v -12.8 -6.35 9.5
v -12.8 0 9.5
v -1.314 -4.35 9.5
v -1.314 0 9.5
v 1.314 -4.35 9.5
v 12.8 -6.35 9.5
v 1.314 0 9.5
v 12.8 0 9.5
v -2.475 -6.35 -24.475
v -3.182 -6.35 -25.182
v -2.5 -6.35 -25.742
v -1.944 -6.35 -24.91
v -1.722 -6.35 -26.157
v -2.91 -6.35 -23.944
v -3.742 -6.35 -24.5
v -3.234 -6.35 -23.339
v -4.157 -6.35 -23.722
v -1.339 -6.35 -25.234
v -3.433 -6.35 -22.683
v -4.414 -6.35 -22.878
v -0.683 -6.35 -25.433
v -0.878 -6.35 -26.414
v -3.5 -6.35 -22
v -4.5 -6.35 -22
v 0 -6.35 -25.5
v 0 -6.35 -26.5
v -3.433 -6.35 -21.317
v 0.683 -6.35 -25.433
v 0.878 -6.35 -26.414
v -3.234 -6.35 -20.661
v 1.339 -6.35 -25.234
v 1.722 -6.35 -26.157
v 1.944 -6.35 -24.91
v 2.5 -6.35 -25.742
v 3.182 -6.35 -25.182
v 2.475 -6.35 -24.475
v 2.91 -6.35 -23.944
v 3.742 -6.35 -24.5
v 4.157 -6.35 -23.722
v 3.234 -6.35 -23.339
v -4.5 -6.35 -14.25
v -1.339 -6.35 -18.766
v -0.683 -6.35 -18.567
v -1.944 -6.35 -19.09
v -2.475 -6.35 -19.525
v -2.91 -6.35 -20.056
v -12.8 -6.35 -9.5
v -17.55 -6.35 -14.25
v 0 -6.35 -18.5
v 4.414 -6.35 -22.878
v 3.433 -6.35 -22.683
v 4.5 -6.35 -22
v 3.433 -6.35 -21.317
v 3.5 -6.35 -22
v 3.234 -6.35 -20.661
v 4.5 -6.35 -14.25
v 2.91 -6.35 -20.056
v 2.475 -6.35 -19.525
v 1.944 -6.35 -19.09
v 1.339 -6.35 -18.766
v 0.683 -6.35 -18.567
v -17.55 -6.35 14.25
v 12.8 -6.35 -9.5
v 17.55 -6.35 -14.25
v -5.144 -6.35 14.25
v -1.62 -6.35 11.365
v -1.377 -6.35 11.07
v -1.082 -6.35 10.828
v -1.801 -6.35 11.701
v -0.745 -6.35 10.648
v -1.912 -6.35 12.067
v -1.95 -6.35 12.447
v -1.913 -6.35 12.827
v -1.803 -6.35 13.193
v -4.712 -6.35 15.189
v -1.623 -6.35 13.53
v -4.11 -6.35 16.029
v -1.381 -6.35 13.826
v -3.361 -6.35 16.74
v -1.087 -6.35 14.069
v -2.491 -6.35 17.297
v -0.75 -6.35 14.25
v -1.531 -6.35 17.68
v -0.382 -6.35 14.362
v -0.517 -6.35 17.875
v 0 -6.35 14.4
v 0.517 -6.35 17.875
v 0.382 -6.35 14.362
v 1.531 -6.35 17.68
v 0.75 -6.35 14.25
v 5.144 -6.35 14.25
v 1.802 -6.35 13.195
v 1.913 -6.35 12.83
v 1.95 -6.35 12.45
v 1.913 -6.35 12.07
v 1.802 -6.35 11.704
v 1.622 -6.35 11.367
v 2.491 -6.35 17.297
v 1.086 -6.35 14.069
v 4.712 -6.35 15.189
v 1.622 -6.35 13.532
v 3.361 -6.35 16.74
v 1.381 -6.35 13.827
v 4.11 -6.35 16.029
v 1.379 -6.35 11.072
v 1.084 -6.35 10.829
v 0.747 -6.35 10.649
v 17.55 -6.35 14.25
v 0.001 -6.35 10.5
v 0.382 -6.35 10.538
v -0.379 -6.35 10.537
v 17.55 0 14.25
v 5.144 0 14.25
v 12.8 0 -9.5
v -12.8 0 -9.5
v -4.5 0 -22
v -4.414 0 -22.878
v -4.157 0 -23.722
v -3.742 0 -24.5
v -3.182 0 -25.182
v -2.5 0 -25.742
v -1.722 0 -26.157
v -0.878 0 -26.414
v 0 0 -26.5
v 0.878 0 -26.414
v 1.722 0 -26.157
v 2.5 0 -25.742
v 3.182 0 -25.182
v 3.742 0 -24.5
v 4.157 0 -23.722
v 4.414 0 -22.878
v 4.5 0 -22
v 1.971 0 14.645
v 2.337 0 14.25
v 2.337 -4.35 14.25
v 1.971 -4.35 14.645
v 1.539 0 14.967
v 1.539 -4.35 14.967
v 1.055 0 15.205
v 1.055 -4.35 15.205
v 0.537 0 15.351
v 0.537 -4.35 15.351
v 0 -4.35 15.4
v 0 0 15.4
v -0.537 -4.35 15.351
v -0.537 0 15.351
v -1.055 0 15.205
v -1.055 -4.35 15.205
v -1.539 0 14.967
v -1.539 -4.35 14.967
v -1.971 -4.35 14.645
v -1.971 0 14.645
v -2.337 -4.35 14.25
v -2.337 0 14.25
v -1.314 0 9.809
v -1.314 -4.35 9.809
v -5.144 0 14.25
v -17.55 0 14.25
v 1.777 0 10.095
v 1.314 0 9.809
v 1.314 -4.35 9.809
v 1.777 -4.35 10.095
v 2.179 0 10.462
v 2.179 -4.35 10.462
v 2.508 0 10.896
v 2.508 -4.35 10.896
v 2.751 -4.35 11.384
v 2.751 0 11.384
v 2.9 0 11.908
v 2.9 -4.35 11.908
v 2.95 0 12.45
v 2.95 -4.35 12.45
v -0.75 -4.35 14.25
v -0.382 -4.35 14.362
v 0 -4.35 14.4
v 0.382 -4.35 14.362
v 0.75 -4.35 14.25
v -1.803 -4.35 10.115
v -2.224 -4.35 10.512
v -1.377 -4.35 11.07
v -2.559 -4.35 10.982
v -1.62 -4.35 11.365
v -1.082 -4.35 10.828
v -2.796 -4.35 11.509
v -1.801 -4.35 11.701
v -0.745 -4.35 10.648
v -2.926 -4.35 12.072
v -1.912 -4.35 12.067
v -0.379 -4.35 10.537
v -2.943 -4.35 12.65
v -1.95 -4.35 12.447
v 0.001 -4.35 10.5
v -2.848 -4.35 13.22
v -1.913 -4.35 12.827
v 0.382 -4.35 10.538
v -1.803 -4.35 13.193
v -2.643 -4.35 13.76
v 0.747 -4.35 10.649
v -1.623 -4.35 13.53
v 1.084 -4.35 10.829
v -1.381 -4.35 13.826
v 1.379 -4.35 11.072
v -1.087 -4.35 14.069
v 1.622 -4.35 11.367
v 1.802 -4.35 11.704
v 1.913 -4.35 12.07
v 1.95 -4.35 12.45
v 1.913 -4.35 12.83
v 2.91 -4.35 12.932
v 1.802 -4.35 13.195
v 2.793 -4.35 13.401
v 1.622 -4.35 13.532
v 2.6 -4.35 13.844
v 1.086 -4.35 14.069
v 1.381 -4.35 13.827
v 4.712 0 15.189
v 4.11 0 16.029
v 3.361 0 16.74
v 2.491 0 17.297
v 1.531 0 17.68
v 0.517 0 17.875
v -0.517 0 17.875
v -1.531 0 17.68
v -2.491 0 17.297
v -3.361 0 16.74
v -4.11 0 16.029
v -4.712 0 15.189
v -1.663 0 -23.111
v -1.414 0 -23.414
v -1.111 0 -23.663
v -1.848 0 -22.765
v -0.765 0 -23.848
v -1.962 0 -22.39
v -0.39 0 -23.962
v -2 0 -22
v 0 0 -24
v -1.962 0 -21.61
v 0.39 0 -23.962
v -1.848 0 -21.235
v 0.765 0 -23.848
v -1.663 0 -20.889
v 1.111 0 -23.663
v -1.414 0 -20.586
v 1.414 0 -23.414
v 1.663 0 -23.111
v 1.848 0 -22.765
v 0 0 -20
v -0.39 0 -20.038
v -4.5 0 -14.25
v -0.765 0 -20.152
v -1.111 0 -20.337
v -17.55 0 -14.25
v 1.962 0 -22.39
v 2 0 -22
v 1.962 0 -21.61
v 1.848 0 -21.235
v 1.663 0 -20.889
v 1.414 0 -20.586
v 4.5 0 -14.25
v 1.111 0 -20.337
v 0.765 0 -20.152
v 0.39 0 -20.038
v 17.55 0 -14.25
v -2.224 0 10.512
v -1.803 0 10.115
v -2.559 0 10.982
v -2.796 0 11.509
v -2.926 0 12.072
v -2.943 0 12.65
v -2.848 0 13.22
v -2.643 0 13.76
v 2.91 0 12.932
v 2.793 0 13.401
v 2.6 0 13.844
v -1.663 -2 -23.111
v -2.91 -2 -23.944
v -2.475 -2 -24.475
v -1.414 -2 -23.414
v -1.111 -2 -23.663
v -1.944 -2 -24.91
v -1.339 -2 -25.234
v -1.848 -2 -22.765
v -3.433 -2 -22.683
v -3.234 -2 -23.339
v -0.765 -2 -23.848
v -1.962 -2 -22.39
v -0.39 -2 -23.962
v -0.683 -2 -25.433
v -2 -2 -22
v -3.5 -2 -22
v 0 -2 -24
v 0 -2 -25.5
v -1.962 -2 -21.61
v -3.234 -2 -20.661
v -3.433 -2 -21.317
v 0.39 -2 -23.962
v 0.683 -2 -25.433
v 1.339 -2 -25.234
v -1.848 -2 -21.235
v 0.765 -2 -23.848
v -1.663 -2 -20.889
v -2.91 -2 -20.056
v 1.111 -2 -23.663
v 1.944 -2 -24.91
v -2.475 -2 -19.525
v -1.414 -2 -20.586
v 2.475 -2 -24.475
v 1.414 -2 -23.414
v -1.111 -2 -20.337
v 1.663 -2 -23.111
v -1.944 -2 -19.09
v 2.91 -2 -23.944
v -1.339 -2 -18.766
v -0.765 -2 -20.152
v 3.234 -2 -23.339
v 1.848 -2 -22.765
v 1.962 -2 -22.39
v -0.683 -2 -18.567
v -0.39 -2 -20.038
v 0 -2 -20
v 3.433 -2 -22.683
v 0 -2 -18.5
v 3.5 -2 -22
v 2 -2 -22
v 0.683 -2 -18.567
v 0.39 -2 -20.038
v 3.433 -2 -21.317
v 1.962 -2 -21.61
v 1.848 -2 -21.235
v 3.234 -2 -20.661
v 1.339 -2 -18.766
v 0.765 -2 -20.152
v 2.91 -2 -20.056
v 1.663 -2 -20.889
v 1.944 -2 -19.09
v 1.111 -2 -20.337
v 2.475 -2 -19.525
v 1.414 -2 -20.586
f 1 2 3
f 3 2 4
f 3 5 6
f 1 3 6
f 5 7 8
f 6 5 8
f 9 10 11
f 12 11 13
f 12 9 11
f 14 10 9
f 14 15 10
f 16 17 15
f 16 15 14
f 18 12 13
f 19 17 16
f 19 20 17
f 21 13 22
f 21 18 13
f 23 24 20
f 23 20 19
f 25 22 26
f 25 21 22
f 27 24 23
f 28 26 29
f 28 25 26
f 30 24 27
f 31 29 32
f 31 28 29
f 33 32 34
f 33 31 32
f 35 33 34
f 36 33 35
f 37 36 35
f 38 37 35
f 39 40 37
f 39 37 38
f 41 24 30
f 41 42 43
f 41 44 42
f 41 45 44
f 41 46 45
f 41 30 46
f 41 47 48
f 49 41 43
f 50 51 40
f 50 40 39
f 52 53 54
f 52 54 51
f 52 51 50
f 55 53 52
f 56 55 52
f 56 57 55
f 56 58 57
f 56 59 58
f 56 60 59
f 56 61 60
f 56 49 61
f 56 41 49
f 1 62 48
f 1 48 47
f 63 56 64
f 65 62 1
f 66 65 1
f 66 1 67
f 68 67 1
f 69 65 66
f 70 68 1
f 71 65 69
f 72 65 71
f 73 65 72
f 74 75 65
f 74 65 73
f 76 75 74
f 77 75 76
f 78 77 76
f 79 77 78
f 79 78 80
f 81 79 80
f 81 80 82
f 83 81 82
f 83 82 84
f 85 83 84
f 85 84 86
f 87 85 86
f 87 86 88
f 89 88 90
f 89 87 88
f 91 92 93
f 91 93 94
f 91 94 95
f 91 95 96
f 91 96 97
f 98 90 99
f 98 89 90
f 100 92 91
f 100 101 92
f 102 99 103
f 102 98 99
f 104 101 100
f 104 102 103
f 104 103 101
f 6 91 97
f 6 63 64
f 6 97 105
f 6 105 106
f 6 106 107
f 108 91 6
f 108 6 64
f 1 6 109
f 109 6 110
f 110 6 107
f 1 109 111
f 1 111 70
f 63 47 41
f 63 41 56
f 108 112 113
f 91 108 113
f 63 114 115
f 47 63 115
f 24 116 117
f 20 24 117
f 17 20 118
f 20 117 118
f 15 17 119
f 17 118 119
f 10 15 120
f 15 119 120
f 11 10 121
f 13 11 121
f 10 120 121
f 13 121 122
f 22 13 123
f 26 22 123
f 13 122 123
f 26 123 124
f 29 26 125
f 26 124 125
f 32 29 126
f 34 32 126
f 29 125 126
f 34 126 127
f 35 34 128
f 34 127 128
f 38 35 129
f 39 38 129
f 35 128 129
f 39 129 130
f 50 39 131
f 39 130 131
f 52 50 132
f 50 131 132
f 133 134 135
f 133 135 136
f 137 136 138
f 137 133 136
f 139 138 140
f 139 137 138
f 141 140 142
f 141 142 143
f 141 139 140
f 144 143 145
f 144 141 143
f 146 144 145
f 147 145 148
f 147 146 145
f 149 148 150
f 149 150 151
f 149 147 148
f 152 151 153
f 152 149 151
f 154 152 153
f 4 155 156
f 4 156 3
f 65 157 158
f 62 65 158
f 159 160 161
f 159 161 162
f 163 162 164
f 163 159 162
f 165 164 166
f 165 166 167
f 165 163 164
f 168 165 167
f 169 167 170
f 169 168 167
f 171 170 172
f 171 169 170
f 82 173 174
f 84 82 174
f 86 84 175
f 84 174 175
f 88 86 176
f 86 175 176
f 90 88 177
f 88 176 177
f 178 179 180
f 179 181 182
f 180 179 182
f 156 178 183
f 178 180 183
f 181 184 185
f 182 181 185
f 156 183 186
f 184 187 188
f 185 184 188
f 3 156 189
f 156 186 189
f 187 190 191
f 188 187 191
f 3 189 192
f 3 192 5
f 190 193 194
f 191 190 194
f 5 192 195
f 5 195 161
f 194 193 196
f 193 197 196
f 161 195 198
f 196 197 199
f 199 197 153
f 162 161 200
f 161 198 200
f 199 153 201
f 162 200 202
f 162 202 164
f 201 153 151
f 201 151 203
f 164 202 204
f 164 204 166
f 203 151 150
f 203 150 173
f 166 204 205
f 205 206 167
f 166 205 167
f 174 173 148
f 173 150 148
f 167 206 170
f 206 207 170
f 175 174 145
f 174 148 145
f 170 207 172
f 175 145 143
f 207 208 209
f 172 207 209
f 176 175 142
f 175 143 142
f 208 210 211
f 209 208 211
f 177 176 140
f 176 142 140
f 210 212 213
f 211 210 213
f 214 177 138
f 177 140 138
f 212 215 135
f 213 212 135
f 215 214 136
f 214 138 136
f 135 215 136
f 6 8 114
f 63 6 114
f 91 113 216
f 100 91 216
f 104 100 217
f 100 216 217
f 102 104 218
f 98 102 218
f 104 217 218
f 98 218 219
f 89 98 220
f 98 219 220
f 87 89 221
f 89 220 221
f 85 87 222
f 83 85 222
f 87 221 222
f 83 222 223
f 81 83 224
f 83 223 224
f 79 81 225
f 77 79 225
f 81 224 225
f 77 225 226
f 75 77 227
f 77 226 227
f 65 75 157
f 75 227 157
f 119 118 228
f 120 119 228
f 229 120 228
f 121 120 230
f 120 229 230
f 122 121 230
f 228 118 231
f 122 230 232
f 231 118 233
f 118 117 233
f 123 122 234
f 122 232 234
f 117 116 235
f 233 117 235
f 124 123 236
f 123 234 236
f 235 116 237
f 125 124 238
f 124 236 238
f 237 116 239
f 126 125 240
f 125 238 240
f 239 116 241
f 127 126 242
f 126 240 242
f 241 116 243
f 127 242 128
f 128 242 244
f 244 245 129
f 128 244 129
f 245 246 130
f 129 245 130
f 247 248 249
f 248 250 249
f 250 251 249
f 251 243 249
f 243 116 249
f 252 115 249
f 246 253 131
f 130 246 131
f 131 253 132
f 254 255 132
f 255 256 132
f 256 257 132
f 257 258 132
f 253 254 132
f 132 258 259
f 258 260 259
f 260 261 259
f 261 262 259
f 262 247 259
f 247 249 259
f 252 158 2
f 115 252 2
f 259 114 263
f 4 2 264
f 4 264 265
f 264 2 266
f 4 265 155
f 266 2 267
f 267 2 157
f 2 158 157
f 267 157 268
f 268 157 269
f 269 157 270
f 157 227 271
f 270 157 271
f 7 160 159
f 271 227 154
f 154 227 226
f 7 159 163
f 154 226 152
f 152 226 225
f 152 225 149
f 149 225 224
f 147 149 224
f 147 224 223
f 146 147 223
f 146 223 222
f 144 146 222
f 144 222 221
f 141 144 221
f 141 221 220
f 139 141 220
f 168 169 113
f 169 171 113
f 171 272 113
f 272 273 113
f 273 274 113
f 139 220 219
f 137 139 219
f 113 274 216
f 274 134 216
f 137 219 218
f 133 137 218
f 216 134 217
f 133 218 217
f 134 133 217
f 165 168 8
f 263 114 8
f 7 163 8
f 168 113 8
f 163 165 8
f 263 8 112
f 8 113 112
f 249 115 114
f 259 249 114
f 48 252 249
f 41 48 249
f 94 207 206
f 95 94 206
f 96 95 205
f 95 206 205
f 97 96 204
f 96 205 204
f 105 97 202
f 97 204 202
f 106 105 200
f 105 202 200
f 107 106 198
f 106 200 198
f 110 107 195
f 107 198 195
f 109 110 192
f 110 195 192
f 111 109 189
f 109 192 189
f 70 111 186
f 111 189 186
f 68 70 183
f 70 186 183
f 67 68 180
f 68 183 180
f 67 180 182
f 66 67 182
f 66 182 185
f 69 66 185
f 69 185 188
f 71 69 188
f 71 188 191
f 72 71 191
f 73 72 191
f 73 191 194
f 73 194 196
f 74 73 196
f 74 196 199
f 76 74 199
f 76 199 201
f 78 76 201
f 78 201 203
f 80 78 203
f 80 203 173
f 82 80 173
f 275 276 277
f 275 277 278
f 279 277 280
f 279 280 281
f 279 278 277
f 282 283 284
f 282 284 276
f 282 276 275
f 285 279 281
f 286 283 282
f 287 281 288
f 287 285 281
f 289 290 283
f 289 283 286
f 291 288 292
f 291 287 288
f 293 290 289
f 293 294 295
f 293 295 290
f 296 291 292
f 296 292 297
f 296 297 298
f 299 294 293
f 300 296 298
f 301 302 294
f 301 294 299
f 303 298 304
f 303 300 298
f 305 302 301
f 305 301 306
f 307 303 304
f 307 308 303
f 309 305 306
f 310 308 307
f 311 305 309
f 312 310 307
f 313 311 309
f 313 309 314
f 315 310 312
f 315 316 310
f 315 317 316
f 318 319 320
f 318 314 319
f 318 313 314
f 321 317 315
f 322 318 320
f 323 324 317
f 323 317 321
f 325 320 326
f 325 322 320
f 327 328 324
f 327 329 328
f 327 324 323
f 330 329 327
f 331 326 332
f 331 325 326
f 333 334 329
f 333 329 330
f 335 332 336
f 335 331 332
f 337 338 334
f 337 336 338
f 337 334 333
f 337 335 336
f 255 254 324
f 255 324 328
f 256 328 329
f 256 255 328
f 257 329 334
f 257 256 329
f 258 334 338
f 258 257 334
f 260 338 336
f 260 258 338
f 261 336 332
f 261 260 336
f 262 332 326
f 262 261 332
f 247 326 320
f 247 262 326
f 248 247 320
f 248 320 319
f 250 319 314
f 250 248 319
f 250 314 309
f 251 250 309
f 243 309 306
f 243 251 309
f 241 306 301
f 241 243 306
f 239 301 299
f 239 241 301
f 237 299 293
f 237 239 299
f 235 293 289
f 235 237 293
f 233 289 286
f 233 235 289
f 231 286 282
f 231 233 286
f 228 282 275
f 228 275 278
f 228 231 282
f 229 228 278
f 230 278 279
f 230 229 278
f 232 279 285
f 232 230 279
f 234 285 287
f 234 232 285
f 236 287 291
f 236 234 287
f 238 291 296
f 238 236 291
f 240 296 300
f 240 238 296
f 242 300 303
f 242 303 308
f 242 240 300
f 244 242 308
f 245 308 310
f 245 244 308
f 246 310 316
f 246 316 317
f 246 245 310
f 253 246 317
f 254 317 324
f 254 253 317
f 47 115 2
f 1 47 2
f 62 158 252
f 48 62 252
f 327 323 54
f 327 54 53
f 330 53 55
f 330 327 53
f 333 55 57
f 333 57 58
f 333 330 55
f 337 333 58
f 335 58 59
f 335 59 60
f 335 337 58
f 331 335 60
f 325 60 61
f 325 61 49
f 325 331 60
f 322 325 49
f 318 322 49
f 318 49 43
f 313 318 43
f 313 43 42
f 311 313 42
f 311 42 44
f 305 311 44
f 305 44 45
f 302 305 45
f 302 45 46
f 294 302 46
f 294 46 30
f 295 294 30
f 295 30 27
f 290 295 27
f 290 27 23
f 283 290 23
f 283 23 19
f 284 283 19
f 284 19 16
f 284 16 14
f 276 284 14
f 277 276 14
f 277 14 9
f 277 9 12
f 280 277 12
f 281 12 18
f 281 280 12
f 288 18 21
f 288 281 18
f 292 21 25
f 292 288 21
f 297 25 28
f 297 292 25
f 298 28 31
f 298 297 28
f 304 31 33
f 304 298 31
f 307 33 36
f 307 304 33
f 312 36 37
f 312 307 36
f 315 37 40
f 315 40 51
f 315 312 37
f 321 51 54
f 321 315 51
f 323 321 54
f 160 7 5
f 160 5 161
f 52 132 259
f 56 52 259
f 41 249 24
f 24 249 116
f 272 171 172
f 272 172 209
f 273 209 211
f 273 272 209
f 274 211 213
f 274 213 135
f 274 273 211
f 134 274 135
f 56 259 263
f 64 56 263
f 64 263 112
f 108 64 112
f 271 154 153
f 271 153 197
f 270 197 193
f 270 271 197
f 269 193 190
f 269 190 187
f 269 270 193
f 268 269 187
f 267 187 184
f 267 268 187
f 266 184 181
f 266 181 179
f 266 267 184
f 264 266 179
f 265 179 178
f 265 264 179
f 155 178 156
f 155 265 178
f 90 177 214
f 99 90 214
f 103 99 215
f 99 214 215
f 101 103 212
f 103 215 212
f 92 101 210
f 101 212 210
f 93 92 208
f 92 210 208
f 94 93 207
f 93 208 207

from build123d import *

# Parameters (mm, degrees)
F0_R     = 3.5
F1_DEPTH = 6.35
F0_R_2   = 2
F2_DEPTH = 2
F4_DEPTH = 4.35


with BuildPart() as f1:
    # F0 (on Front) → F1 (new body)
    with BuildSketch(Plane.XZ):
        with BuildLine():
            ThreePointArc((2.95, 12.45), (2.0859650045, 10.3640349955), (0, 9.5))
            ThreePointArc((0, 9.5), (-2.6469321865, 11.1475983722), (-2.3371991785, 14.25))
            Line((-2.3371991785, 14.25), (-5.144171459, 14.25))
            Line((-5.144171459, 14.25), (-17.55, 14.25))
            Line((-17.55, 14.25), (-17.55, -14.25))
            Line((-17.55, -14.25), (-4.5, -14.25))
            Line((-4.5, -14.25), (4.5, -14.25))
            Line((4.5, -14.25), (17.55, -14.25))
            Line((17.55, -14.25), (17.55, 14.25))
            Line((17.55, 14.25), (5.144171459, 14.25))
            Line((5.144171459, 14.25), (2.3371991785, 14.25))
            ThreePointArc((2.3371991785, 14.25), (2.7926007212, 13.4007266756), (2.95, 12.45))
        make_face()
        Polygon((-12.8, -9.5), (-12.8, 9.5), (0, 9.5), (12.8, 9.5), (12.8, -9.5), align=None, mode=Mode.SUBTRACT)
        with BuildLine():
            ThreePointArc((-2.3371991785, 14.25), (-2.6469321865, 11.1475983722), (0, 9.5))
            ThreePointArc((0, 9.5), (2.0859650045, 10.3640349955), (2.95, 12.45))
            ThreePointArc((2.95, 12.45), (2.7926007212, 13.4007266756), (2.3371991785, 14.25))
            Line((2.3371991785, 14.25), (0.75, 14.25))
            ThreePointArc((0.75, 14.25), (1.622498074, 13.5316653826), (1.95, 12.45))
            ThreePointArc((1.95, 12.45), (-1.0816653826, 10.827501926), (-0.75, 14.25))
            Line((-0.75, 14.25), (-2.3371991785, 14.25))
        make_face()
        with BuildLine():
            Line((-5.144171459, 14.25), (-2.3371991785, 14.25))
            ThreePointArc((-2.3371991785, 14.25), (0, 15.4), (2.3371991785, 14.25))
            Line((2.3371991785, 14.25), (5.144171459, 14.25))
            ThreePointArc((5.144171459, 14.25), (0, 17.9), (-5.144171459, 14.25))
        make_face()
        with BuildLine():
            ThreePointArc((2.3371991785, 14.25), (0, 15.4), (-2.3371991785, 14.25))
            Line((-2.3371991785, 14.25), (-0.75, 14.25))
            ThreePointArc((-0.75, 14.25), (0, 14.4), (0.75, 14.25))
            Line((0.75, 14.25), (2.3371991785, 14.25))
        make_face()
        with BuildLine():
            Line((4.5, -14.25), (-4.5, -14.25))
            Line((-4.5, -14.25), (-4.5, -22))
            ThreePointArc((-4.5, -22), (0, -26.5), (4.5, -22))
            Line((4.5, -22), (4.5, -14.25))
        make_face()
        with Locations((0, -22)):
            Circle(F0_R, mode=Mode.SUBTRACT)
    extrude(amount=F1_DEPTH)

    # F0 (on Front) → F2 (join)
    with BuildSketch(Plane.XZ):
        with Locations((0, -22)):
            Circle(F0_R)
        with Locations((0, -22)):
            Circle(F0_R_2, mode=Mode.SUBTRACT)
    extrude(amount=F2_DEPTH)

    # F0 (on Front) + F3 (on face) → F4 (cut)
    with BuildSketch(Plane.XZ):
        with BuildLine():
            ThreePointArc((-2.3371991785, 14.25), (-2.6469321865, 11.1475983722), (0, 9.5))
            ThreePointArc((0, 9.5), (2.0859650045, 10.3640349955), (2.95, 12.45))
            ThreePointArc((2.95, 12.45), (2.7926007212, 13.4007266756), (2.3371991785, 14.25))
            Line((2.3371991785, 14.25), (0.75, 14.25))
            ThreePointArc((0.75, 14.25), (1.622498074, 13.5316653826), (1.95, 12.45))
            ThreePointArc((1.95, 12.45), (-1.0816653826, 10.827501926), (-0.75, 14.25))
            Line((-0.75, 14.25), (-2.3371991785, 14.25))
        make_face()
        with BuildLine():
            ThreePointArc((2.3371991785, 14.25), (0, 15.4), (-2.3371991785, 14.25))
            Line((-2.3371991785, 14.25), (-0.75, 14.25))
            ThreePointArc((-0.75, 14.25), (0, 14.4), (0.75, 14.25))
            Line((0.75, 14.25), (2.3371991785, 14.25))
        make_face()
    with BuildSketch(Plane.XZ):
        with BuildLine():
            Line((-1.3135344248, 9.5), (0, 9.5))
            ThreePointArc((0, 9.5), (-0.6746464011, 9.5781796307), (-1.3135344248, 9.8085747569))
            Line((-1.3135344248, 9.8085747569), (-1.3135344248, 9.5))
        make_face()
        with BuildLine():
            Line((1.3135344248, 9.5), (1.3135344248, 9.8085747569))
            ThreePointArc((1.3135344248, 9.8085747569), (0.6746464011, 9.5781796307), (0, 9.5))
            Line((0, 9.5), (1.3135344248, 9.5))
        make_face()
    extrude(amount=F4_DEPTH, mode=Mode.SUBTRACT)


solid = f1.part
